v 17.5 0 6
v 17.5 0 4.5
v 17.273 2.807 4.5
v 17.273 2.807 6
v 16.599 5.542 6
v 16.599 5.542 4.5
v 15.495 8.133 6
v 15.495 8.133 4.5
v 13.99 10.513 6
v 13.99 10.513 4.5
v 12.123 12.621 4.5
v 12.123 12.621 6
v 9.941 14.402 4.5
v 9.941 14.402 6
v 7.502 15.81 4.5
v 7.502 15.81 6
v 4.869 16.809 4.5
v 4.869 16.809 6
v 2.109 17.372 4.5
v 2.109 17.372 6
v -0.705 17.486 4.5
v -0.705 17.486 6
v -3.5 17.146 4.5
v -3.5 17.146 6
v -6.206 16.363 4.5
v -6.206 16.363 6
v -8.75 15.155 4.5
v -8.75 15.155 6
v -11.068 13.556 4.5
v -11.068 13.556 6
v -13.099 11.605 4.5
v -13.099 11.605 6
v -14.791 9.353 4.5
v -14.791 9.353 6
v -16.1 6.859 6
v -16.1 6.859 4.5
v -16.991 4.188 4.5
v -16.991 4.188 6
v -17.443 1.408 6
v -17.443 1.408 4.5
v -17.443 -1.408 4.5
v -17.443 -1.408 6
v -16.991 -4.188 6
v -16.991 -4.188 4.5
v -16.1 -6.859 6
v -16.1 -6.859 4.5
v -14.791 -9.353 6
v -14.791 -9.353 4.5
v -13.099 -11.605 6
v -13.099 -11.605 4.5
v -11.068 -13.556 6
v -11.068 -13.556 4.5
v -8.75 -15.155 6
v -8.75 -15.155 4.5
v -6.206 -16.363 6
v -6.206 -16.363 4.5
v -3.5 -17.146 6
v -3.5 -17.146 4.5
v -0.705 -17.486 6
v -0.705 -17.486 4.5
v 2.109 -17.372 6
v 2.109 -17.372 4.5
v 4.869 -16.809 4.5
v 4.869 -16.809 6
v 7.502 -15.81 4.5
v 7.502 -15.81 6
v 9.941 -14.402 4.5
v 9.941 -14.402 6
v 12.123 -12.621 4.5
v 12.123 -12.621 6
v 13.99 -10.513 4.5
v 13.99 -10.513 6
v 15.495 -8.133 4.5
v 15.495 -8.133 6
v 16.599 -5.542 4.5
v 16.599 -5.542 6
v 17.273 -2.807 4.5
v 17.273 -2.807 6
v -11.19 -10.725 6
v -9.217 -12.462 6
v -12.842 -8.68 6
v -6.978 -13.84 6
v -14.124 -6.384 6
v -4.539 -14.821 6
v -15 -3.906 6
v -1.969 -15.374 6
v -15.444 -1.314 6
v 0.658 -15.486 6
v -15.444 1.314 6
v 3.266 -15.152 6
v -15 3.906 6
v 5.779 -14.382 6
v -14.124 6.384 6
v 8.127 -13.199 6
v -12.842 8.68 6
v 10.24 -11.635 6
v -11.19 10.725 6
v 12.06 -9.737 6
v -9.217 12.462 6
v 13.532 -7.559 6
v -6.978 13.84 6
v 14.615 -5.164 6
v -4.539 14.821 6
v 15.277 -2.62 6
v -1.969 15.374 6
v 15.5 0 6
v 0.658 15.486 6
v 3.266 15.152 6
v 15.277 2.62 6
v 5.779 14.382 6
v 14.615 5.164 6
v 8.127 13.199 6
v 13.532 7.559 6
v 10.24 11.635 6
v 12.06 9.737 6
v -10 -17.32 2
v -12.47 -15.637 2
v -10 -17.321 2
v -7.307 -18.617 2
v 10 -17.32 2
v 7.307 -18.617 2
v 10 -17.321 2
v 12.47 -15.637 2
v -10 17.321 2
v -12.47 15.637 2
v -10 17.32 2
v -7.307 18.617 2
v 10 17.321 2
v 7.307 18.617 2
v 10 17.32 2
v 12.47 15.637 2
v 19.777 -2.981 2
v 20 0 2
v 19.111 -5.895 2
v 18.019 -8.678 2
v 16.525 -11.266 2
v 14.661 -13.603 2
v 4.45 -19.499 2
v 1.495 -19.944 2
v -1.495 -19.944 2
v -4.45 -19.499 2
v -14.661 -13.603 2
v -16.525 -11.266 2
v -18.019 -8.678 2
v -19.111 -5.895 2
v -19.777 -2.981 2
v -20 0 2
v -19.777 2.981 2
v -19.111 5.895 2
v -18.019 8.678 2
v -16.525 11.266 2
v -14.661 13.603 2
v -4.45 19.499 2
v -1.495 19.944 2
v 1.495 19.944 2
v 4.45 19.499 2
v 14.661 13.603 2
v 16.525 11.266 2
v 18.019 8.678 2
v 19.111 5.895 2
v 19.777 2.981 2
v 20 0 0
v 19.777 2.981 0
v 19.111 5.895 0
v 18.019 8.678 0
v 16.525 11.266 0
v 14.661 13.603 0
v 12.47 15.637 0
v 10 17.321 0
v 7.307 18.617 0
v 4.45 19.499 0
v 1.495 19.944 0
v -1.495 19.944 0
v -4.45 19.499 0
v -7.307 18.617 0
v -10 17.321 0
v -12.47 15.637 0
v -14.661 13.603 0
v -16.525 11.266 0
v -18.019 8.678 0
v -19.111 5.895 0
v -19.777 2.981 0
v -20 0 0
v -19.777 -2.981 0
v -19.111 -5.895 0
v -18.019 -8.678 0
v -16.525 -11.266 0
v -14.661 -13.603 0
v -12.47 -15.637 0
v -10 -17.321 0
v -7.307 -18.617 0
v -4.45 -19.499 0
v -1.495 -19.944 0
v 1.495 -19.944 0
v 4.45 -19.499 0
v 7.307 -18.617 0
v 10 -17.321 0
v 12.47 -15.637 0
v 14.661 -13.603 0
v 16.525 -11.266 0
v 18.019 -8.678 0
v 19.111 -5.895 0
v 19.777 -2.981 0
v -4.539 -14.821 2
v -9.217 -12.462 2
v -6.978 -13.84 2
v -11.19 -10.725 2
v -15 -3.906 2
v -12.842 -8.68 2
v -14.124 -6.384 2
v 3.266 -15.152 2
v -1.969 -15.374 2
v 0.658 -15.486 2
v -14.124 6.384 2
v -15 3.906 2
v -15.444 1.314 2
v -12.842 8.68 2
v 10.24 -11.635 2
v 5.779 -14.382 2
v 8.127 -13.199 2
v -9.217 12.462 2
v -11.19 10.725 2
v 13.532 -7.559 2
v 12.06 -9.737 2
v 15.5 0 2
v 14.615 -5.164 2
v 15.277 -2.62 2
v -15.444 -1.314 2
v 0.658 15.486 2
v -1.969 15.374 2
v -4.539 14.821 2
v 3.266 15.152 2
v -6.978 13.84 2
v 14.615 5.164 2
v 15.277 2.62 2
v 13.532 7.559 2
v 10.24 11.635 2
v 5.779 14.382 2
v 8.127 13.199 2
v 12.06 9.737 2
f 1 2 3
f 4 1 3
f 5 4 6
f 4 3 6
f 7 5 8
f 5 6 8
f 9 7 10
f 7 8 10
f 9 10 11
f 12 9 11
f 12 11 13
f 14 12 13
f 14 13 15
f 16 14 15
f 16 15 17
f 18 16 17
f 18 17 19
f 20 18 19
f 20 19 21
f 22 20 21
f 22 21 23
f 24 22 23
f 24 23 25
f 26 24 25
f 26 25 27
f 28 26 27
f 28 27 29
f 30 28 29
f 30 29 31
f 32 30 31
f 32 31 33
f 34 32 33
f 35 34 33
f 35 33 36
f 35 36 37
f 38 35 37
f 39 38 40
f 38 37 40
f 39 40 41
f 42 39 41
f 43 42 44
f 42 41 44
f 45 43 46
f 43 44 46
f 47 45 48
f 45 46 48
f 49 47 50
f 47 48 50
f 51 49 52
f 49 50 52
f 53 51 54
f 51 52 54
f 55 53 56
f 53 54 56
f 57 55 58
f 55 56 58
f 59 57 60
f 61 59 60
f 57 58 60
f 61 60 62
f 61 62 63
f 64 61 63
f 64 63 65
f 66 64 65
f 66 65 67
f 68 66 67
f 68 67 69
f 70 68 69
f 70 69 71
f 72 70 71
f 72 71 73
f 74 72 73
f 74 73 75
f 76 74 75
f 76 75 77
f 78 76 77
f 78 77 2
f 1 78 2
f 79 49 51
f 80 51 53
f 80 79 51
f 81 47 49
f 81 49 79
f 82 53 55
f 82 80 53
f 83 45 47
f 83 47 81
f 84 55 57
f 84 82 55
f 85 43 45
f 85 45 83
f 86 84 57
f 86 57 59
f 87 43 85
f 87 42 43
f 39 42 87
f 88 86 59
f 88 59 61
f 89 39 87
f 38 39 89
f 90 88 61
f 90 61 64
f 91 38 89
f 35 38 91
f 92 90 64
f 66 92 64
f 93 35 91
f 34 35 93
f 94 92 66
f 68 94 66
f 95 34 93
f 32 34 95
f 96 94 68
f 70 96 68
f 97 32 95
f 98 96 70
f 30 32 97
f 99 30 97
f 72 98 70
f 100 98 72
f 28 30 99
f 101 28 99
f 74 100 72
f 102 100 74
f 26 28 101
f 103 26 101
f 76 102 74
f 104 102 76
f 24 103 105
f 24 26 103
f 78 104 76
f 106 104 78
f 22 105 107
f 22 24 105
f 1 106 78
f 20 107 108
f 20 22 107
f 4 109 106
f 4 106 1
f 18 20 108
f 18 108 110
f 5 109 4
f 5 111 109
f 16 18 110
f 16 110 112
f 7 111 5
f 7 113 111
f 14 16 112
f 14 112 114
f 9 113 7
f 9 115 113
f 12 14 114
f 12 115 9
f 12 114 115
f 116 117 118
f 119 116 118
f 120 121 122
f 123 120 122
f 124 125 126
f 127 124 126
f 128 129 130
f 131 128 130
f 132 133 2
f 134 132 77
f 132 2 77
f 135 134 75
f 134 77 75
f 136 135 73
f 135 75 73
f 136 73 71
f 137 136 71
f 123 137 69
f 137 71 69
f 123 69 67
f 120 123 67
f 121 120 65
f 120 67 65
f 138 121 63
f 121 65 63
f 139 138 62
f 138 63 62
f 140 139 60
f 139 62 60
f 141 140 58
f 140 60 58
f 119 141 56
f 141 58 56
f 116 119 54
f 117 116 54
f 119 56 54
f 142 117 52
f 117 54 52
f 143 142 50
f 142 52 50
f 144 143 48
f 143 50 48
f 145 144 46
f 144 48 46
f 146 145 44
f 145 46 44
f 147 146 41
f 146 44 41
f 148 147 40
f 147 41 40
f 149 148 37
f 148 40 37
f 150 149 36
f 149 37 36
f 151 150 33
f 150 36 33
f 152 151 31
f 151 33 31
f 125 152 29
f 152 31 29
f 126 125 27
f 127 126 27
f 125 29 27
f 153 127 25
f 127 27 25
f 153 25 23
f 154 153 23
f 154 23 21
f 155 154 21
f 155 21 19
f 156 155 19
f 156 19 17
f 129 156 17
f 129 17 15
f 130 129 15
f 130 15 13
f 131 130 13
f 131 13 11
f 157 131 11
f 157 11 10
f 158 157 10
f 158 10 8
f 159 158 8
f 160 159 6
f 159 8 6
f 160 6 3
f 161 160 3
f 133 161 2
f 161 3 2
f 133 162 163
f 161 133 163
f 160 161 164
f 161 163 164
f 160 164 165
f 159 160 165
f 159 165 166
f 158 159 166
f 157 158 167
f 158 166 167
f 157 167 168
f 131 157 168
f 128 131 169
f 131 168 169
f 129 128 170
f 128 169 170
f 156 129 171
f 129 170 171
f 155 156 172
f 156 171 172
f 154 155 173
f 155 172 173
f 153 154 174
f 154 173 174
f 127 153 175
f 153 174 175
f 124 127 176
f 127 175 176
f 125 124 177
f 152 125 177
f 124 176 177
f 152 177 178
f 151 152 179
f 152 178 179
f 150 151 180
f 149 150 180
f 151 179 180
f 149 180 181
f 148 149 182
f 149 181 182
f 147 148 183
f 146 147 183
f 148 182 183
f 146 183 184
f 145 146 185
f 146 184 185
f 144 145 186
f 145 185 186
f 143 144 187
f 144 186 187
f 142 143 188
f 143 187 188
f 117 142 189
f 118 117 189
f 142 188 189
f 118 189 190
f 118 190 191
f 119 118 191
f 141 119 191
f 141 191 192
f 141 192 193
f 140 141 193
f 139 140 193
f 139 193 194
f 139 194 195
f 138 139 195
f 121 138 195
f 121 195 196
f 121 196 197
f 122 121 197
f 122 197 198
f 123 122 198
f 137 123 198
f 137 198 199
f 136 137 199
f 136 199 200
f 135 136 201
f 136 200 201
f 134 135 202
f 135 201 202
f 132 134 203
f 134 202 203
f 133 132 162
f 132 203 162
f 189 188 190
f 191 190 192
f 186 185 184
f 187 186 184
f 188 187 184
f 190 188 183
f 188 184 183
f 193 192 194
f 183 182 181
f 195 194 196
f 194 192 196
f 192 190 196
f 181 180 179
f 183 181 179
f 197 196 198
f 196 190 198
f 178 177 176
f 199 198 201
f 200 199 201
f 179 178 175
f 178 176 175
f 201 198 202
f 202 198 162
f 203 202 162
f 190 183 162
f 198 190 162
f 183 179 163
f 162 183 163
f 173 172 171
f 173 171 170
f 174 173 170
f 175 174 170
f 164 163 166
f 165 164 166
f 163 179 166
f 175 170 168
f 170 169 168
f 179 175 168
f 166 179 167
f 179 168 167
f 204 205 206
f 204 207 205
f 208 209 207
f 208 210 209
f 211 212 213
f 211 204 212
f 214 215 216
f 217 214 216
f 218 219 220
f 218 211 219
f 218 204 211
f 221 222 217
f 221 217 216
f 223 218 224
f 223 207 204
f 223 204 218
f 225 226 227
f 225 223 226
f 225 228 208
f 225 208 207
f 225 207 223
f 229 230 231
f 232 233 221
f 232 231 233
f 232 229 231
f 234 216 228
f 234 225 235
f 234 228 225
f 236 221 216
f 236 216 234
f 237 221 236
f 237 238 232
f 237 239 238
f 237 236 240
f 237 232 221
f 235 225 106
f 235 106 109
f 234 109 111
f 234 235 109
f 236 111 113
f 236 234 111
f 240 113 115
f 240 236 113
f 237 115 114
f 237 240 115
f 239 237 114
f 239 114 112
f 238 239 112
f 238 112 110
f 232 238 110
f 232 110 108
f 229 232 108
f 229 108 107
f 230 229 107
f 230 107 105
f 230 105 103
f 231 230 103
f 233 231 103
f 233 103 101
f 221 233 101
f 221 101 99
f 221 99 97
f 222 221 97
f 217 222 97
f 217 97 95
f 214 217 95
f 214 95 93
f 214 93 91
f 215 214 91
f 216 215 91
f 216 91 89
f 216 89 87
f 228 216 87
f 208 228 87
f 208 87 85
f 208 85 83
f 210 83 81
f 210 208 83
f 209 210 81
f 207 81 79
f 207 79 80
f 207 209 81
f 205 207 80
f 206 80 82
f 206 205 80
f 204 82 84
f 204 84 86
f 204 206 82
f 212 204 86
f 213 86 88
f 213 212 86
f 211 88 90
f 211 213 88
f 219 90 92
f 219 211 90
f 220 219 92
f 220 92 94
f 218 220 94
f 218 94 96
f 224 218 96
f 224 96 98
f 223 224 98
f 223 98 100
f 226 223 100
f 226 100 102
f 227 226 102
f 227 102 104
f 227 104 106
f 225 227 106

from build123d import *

# Parameters (mm, degrees)
F0_R     = 17.5
F0_R_2   = 15.5
F1_DEPTH = 6
F2_R     = 20
F3_DEPTH = 2
F4_SIZE  = 2.49999


# Not quite as in the source:
# - a fillet or chamfer is up to 0.001 mm smaller than in the source, because OpenCascade refuses the exact size


with BuildPart() as f1:
    # F0 (on Top) → F1 (new body)
    with BuildSketch(Plane.XY):
        Circle(F0_R)
        Circle(F0_R_2, mode=Mode.SUBTRACT)
    extrude(amount=F1_DEPTH)

    # F2 (on Top) → F3 (join)
    with BuildSketch(Plane.XY):
        Circle(F2_R)
    extrude(amount=F3_DEPTH)

    # F4 (size 2.5 in the source; OpenCascade refuses exactly that, so slightly less here)
    f4_edges = [f1.edges().sort_by_distance(p)[0] for p in [
        (-17.5, 0, 2),
    ]]
    chamfer(f4_edges, length=F4_SIZE)


solid = f1.part
